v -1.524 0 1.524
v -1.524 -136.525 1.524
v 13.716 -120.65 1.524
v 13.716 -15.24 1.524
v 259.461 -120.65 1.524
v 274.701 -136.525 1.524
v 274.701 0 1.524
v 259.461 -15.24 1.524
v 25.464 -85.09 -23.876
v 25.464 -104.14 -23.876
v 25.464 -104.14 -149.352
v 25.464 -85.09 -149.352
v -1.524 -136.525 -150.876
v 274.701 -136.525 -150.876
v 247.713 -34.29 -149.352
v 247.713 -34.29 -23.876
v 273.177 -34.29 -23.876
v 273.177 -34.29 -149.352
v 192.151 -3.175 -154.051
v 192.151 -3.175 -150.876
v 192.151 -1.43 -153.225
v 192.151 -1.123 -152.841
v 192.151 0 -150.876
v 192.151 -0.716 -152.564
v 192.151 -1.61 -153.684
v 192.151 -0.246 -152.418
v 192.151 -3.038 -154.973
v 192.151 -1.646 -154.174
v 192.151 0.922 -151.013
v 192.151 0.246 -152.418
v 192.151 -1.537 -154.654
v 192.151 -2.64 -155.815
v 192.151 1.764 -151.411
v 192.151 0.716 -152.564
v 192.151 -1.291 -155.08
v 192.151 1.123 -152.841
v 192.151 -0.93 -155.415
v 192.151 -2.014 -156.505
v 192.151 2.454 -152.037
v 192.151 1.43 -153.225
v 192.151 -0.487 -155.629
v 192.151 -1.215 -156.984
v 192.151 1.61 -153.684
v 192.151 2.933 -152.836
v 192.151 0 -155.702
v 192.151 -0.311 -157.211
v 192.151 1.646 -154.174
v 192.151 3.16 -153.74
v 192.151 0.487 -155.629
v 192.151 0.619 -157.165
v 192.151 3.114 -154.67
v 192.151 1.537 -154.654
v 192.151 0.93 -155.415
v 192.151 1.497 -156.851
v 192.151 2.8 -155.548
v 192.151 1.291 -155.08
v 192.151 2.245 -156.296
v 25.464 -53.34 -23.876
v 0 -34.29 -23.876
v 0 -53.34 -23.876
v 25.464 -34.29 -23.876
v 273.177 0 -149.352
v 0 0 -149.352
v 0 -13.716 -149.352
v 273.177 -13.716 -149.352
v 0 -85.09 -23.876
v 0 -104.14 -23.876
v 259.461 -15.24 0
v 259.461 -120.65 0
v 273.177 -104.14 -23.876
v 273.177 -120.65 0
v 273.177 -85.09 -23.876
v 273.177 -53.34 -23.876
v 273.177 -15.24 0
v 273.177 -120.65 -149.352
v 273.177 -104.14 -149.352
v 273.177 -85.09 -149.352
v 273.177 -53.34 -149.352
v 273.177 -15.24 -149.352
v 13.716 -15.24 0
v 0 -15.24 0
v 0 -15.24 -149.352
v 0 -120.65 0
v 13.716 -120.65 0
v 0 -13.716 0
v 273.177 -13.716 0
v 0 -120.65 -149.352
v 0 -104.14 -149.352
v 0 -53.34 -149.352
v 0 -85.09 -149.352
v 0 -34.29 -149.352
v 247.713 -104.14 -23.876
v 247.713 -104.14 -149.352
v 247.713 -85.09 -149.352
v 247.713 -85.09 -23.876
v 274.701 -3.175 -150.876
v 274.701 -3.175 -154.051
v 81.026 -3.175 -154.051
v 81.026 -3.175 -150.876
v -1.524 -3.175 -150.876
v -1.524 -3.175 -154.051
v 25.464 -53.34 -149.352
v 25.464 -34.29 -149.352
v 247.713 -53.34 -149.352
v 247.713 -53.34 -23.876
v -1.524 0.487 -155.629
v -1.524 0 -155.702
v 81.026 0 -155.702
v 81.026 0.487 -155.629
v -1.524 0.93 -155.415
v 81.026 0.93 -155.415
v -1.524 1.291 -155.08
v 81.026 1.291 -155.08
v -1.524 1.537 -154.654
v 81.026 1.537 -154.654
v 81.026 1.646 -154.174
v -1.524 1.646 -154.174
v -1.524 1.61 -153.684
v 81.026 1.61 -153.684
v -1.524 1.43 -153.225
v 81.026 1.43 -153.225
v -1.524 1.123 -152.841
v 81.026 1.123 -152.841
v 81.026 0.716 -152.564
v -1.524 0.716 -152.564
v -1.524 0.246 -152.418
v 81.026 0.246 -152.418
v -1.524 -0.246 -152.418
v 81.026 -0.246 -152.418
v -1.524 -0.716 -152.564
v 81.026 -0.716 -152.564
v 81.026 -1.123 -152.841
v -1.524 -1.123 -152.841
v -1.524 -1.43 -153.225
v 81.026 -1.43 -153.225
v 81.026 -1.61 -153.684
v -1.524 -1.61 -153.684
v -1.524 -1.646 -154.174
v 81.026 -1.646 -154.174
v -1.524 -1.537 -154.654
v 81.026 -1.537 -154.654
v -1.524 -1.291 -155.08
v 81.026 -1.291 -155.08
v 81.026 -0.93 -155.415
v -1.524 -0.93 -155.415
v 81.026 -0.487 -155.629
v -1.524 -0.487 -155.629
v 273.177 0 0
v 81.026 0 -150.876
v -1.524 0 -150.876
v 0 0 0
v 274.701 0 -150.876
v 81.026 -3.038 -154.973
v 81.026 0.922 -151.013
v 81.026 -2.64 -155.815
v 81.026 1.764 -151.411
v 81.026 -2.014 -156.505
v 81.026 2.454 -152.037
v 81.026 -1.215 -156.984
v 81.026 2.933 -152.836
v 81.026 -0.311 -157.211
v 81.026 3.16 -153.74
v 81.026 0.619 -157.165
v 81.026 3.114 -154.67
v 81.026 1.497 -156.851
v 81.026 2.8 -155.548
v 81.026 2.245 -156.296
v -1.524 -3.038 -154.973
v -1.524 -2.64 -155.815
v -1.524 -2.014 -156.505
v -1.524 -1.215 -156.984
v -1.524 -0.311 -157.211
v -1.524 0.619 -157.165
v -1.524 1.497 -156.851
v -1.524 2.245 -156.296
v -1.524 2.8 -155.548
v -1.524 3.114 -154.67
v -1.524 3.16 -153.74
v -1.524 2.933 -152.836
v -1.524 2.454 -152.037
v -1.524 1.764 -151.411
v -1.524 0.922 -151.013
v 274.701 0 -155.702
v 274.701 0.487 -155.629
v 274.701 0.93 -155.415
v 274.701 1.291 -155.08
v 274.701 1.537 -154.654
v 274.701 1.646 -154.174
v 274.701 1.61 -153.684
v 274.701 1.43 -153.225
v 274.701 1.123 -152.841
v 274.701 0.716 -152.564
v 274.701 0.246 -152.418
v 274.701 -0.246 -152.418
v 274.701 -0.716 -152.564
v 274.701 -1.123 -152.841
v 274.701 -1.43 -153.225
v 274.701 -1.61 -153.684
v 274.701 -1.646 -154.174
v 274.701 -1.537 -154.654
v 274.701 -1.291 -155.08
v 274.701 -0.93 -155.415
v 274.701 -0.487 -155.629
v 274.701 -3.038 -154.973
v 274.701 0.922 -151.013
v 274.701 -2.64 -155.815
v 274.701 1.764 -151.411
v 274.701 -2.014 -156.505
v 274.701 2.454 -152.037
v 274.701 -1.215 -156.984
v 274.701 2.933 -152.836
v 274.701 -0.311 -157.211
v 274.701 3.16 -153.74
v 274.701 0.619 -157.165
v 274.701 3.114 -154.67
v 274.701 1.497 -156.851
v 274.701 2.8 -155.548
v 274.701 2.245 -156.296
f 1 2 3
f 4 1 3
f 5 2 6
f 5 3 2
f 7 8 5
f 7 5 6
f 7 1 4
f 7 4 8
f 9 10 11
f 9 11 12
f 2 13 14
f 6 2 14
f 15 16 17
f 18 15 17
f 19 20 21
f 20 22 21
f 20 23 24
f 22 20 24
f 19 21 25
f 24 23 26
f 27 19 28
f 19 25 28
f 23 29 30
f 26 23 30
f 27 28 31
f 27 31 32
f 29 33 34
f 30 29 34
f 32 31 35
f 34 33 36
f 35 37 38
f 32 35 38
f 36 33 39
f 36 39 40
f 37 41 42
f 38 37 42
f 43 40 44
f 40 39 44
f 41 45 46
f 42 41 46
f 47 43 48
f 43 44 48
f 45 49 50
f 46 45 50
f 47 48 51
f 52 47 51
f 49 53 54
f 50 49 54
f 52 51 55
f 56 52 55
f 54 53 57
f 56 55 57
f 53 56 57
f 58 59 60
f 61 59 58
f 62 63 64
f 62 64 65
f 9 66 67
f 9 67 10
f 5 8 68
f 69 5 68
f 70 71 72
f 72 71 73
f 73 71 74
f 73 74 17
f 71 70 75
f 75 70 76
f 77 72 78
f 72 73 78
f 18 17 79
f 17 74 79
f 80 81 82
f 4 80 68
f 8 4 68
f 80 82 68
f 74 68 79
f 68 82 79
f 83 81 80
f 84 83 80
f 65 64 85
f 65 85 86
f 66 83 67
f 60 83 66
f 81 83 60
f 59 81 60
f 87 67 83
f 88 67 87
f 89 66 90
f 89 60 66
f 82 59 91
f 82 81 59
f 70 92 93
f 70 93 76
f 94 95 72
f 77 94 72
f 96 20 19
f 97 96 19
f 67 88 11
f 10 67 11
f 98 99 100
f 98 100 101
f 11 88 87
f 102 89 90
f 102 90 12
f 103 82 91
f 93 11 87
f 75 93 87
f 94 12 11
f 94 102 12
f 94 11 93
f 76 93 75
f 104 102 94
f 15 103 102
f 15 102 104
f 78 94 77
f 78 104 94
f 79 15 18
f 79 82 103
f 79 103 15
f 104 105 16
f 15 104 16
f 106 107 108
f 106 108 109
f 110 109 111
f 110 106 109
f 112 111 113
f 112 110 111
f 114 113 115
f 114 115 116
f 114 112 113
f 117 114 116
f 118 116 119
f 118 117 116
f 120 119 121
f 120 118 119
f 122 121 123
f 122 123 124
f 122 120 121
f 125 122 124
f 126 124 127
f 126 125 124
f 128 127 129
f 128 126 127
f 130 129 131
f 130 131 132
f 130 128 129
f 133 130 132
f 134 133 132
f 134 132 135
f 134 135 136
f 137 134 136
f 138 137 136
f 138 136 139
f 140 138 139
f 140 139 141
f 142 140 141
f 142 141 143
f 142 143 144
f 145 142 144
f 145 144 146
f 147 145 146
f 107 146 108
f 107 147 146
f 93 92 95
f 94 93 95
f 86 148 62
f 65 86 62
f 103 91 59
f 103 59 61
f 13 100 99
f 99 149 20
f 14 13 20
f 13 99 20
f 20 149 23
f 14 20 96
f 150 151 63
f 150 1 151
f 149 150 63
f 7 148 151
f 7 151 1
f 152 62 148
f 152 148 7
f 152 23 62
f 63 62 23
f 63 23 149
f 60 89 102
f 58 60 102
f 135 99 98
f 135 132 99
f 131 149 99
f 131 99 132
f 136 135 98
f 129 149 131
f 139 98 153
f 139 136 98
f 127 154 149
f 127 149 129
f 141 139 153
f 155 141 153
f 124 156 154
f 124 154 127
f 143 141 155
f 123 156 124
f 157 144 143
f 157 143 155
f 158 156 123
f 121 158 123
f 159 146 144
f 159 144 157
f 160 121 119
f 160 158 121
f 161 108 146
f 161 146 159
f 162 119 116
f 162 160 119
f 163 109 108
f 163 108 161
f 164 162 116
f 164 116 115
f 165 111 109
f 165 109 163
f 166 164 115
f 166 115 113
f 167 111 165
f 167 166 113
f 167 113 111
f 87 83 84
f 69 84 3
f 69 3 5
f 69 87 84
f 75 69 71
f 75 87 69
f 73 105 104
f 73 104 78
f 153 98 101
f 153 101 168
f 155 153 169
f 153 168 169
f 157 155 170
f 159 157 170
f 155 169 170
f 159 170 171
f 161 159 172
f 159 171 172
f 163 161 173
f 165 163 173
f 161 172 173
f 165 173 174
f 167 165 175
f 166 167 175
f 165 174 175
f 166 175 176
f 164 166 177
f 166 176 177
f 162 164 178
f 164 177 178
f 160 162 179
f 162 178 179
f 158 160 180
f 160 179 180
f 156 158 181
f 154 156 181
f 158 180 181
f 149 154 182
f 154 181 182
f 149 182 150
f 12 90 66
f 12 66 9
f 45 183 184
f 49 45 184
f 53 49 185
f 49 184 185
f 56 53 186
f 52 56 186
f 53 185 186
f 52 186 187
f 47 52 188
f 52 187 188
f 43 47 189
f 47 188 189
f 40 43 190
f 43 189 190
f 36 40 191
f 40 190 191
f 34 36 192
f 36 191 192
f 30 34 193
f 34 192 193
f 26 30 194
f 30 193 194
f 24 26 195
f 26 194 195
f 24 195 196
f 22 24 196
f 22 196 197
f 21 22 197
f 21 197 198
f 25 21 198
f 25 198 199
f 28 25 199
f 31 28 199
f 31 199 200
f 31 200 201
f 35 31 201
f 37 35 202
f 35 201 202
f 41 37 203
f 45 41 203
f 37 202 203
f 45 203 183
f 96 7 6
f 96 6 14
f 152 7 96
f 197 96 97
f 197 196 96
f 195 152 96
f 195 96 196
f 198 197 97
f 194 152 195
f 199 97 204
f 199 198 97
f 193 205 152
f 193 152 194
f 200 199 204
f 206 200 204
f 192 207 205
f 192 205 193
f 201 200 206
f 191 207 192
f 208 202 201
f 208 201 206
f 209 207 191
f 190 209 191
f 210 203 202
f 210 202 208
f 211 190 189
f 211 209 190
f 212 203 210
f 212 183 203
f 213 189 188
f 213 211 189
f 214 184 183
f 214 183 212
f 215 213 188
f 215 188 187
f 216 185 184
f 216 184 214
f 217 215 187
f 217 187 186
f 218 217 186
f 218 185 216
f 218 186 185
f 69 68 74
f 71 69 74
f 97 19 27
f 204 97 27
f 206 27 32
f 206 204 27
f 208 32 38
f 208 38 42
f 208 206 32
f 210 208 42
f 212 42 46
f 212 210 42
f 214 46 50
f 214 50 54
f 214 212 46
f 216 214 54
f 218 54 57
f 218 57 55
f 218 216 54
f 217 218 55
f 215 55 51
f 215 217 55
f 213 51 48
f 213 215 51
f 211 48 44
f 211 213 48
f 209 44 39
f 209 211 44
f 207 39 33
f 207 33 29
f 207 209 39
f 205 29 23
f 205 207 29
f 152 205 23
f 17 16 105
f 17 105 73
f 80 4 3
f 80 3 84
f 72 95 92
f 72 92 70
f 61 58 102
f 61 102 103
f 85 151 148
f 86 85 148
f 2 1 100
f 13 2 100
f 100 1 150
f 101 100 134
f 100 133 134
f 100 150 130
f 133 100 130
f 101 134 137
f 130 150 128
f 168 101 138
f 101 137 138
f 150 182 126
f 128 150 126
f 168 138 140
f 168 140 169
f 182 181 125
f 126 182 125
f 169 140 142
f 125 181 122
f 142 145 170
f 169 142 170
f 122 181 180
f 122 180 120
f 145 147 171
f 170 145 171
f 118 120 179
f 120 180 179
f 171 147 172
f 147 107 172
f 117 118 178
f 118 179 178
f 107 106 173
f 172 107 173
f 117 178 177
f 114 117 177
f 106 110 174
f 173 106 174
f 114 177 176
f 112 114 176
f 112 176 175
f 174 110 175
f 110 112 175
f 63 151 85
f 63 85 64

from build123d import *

# Parameters (mm, degrees)
SKETCH1_W               = 276.225
SKETCH1_H               = 152.4
BULK_EXTRUDE_DEPTH      = 136.525
SKETCH1_13_W            = 273.177
SKETCH1_13_H            = 149.352
SKETCH1_13_W_2          = 245.745
SKETCH1_13_H_2          = 1.524
INNER_SHELL_CUT_DEPTH   = 120.65
SKETCH1_14_W            = 245.745
SKETCH1_14_H            = 1.524
TOP_WALL_EXTRUDE_DEPTH  = 15.24
TOP_START               = -15.24
SKETCH1_15_W            = 273.177
SKETCH1_15_H            = 149.352
TOP_FLOOR_EXTRUDE_DEPTH = 1.524
SKETCH5_R               = 1.651
HINGE_EXTRUDE_DEPTH     = 82.55
SKETCH7_W               = 25.4635
SKETCH7_H               = 19.05
RAILS_EXTRUDE_DEPTH     = 125.476


with BuildPart() as part:
    # Sketch1 → Bulk-Extrude (new body)
    with BuildSketch(Plane(origin=(0, 0, 0), x_dir=(1, 0, 0), z_dir=(0, 1, 0))):
        with Locations((136.5885, 74.676)):
            Rectangle(SKETCH1_W, SKETCH1_H)
    extrude(amount=-BULK_EXTRUDE_DEPTH)

    # Sketch1<13> → Inner Shell-Cut (cut)
    with BuildSketch(Plane(origin=(0, 0, 0), x_dir=(1, 0, 0), z_dir=(0, 1, 0))):
        with Locations((136.5885, 74.676)):
            Rectangle(SKETCH1_13_W, SKETCH1_13_H)
        with Locations((136.5885, -0.762)):
            Rectangle(SKETCH1_13_W_2, SKETCH1_13_H_2)
    extrude(amount=-INNER_SHELL_CUT_DEPTH, mode=Mode.SUBTRACT)

    # Sketch1<14> → Top Wall-Extrude (add)
    with BuildSketch(Plane(origin=(0, 0, 0), x_dir=(1, 0, 0), z_dir=(0, 1, 0))):
        with Locations((136.5885, -0.762)):
            Rectangle(SKETCH1_14_W, SKETCH1_14_H)
    extrude(amount=-TOP_WALL_EXTRUDE_DEPTH)

    # Sketch1<15> → Top Floor-Extrude (add)
    with BuildSketch(Plane(origin=(0, 0, 0), x_dir=(1, 0, 0), z_dir=(0, 1, 0)).offset(TOP_START)):
        with Locations((136.5885, 74.676)):
            Rectangle(SKETCH1_15_W, SKETCH1_15_H)
    extrude(amount=TOP_FLOOR_EXTRUDE_DEPTH)

    # Sketch5 → Hinge-Extrude (add)
    with BuildSketch(Plane(origin=(274.701, 0, 0), x_dir=(0, 0, -1), z_dir=(1, 0, 0))):
        with BuildLine():
            Line((150.876, 0), (150.876, -3.175))
            Line((150.876, -3.175), (154.051, -3.175))
            ThreePointArc((154.051, -3.175), (156.29606403, 2.24506403), (150.876, 0))
        make_face()
        with Locations((154.051, 0)):
            Circle(SKETCH5_R, mode=Mode.SUBTRACT)
    hinge_extrude = extrude(amount=-HINGE_EXTRUDE_DEPTH)

    # Mirror1: Hinge-Extrude across plane
    add(hinge_extrude.mirror(Plane(origin=(136.5885, 0, 0), x_dir=(0, 0, 1), z_dir=(1, 0, 0))))

    # Sketch7 → Rails-Extrude (add)
    with BuildSketch(Plane.XY.offset(-149.352)):
        with Locations((12.73175, -43.815)):
            Rectangle(SKETCH7_W, SKETCH7_H)
        with Locations((260.44525, -43.815)):
            Rectangle(SKETCH7_W, SKETCH7_H)
        with Locations((12.73175, -94.615)):
            Rectangle(SKETCH7_W, SKETCH7_H)
        with Locations((260.44525, -94.615)):
            Rectangle(SKETCH7_W, SKETCH7_H)
    extrude(amount=RAILS_EXTRUDE_DEPTH)


solid = part.part
